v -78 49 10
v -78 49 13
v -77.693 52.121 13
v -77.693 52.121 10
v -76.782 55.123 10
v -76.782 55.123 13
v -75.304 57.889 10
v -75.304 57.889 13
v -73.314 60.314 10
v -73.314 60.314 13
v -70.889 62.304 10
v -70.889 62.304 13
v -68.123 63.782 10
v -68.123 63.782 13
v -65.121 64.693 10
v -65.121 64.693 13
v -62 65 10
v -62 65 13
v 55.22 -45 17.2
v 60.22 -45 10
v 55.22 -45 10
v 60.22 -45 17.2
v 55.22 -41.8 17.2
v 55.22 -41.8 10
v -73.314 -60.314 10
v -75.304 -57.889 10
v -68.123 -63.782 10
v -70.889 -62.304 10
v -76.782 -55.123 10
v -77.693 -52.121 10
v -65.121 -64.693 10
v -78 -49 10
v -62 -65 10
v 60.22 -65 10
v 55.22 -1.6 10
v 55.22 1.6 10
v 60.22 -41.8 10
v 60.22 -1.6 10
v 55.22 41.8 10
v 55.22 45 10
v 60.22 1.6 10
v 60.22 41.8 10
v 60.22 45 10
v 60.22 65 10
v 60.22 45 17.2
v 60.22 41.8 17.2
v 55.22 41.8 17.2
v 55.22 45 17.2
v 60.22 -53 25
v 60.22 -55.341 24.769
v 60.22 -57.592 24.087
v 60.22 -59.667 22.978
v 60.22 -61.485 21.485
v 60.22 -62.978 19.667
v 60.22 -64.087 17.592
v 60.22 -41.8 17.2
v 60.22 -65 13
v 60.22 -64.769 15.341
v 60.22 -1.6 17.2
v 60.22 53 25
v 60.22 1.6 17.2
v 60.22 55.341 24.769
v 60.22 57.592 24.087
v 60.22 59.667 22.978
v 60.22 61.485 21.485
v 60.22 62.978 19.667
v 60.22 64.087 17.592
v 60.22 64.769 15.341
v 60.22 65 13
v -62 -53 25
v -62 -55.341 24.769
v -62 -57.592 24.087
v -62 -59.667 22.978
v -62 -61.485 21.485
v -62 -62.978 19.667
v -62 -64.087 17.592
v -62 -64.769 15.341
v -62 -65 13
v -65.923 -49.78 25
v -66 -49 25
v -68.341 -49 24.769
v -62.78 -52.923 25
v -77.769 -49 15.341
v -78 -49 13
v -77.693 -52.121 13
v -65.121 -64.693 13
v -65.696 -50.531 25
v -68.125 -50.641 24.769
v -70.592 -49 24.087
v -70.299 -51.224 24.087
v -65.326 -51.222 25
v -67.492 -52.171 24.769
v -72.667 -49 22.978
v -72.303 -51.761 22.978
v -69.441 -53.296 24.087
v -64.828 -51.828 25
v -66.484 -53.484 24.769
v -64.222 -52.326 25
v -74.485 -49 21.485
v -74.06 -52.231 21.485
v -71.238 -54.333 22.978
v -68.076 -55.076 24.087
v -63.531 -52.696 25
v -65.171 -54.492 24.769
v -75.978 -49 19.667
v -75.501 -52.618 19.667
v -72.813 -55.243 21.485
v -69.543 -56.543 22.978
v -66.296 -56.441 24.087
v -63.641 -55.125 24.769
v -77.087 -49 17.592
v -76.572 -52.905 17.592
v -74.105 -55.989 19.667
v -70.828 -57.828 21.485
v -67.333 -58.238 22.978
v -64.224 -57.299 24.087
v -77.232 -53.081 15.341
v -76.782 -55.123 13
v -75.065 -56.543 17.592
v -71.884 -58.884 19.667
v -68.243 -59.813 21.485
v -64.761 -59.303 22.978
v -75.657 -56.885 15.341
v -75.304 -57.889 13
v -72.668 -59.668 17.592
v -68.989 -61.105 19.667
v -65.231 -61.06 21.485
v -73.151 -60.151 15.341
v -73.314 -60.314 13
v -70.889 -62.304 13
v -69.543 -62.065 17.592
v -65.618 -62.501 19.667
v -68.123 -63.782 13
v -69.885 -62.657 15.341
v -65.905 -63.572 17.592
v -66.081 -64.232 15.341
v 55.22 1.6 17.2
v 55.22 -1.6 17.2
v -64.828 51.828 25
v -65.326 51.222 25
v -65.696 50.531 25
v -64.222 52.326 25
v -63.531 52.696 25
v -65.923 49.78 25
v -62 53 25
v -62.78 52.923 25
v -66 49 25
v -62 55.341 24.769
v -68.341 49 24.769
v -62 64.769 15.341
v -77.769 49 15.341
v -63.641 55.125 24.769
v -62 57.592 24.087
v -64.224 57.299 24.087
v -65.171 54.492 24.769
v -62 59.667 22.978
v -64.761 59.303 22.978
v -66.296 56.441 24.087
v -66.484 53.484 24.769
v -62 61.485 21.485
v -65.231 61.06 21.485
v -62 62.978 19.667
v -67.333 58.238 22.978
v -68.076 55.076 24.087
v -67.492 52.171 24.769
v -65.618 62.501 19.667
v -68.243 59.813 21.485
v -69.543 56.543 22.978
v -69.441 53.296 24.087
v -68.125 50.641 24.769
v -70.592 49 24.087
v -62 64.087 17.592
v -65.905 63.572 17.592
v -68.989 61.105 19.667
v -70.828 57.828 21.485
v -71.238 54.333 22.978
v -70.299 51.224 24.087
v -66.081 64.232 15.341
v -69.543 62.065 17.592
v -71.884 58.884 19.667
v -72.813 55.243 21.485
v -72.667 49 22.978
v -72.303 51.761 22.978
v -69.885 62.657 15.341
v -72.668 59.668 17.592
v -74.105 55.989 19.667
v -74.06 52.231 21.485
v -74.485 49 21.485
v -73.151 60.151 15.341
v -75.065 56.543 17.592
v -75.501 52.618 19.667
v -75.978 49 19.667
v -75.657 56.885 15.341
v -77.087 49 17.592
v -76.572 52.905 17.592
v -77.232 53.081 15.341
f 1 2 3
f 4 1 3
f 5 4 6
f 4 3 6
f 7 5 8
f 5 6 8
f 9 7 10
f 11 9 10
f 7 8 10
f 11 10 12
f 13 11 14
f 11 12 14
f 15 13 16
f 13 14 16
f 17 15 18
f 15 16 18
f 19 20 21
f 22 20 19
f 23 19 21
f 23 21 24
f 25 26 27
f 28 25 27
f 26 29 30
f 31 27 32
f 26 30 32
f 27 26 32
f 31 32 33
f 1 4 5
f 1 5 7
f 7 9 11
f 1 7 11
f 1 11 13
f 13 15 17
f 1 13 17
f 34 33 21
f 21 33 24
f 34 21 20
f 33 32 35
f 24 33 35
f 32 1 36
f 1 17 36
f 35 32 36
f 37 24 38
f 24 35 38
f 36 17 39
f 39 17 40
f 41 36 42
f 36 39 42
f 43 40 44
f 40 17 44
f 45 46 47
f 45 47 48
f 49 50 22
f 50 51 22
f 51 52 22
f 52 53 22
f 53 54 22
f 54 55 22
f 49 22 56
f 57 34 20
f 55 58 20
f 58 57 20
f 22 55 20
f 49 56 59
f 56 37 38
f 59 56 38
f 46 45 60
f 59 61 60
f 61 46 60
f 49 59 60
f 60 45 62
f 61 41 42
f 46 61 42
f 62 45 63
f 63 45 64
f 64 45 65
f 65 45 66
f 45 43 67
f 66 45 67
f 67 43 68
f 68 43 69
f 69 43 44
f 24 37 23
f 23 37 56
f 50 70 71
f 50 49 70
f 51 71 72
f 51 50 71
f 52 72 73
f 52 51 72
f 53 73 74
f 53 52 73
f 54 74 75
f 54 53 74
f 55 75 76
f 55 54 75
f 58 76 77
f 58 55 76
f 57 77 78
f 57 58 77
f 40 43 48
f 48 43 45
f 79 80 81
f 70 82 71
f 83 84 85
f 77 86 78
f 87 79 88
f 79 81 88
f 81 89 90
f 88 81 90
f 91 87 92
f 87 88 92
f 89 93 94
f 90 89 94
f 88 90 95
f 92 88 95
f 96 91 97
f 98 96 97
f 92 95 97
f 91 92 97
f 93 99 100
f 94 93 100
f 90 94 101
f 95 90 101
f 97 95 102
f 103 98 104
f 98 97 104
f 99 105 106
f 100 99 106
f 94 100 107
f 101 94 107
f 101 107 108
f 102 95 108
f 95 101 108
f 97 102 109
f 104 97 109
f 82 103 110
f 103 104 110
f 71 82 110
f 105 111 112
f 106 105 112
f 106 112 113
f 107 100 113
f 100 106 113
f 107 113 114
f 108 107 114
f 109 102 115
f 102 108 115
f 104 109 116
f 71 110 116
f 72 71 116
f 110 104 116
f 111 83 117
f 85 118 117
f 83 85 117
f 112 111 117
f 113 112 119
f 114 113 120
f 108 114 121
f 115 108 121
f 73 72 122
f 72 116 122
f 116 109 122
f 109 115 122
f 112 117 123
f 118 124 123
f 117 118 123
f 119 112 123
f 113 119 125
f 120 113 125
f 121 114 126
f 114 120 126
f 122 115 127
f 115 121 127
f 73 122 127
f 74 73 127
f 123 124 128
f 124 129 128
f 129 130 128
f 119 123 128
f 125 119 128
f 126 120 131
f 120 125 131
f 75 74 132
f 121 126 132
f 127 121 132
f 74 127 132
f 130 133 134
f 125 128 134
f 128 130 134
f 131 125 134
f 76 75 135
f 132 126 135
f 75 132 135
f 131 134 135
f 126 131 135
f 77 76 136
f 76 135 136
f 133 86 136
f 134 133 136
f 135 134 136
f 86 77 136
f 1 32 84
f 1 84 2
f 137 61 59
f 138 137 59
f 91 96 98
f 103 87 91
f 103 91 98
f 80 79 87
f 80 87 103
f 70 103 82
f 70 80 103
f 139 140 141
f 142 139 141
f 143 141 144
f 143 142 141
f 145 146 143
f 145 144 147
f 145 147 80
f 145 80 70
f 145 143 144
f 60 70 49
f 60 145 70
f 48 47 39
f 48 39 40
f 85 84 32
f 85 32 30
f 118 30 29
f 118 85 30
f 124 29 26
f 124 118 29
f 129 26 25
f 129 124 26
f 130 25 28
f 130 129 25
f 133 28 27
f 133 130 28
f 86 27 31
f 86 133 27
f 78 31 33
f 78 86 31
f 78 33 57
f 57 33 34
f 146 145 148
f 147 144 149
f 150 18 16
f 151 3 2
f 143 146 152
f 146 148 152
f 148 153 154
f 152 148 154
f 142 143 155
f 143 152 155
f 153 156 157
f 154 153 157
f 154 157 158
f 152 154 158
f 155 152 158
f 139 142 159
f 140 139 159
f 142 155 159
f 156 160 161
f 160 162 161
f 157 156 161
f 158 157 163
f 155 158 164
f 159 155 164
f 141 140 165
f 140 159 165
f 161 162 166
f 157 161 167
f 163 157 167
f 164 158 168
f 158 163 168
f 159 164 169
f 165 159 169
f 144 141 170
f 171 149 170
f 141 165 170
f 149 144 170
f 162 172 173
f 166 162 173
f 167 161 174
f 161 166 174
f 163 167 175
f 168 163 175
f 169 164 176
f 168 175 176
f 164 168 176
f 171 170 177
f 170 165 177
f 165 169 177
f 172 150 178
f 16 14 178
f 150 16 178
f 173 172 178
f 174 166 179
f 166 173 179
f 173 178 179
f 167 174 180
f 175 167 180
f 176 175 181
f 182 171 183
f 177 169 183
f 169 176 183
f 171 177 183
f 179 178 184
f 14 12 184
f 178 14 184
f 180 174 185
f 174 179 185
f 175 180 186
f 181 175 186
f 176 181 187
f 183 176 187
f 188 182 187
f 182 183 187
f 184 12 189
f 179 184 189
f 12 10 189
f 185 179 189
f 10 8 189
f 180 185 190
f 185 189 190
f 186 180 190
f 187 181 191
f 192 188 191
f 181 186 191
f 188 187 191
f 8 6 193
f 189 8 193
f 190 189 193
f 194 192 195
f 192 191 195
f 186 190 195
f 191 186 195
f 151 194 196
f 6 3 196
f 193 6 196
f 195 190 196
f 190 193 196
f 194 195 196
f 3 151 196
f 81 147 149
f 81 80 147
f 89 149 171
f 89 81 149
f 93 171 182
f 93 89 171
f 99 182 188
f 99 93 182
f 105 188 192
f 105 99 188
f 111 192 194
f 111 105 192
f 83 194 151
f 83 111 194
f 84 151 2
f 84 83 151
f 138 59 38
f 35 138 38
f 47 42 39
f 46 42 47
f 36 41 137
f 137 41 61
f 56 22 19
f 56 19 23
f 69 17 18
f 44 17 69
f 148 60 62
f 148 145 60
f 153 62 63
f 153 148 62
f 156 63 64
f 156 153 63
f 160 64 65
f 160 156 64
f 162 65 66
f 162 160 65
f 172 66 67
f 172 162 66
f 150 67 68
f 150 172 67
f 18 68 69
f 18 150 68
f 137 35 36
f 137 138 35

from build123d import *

# Parameters (mm, degrees)
F0_W     = 138.2199470003
F0_H     = 130
F1_DEPTH = 25
F2_R     = 16
F3_R     = 12
F4_DEPTH = 10
F5_W     = 3.2
F5_H     = 7.2
F6_DEPTH = 5


with BuildPart() as f1:
    # F0 (on Top) → F1 (new body)
    with BuildSketch(Plane.XY):
        with Locations((-8.8900264998, 0)):
            Rectangle(F0_W, F0_H)
    extrude(amount=F1_DEPTH)

    # F2
    f2_edges = [f1.edges().sort_by_distance(p)[0] for p in [
        (-78, -65, 12.5),
        (-78, 65, 12.5),
    ]]
    fillet(f2_edges, radius=F2_R)

    # F3
    f3_edges = [f1.edges().sort_by_distance(p)[0] for p in [
        (-0.890026, -65, 25),
    ]]
    fillet(f3_edges, radius=F3_R)

    # F4 (cut): a face of the model
    f4_faces = [f1.faces().sort_by_distance(p)[0] for p in [
        (-8.4868143179, 0, 0),
    ]]
    extrude(f4_faces, amount=-F4_DEPTH, mode=Mode.SUBTRACT)

    # F5 (on face) → F6 (cut)
    with BuildSketch(Plane.YZ.offset(60.2199470003)):
        with Locations((-43.4, 13.6)):
            Rectangle(F5_W, F5_H)
        Polygon((-1.6, 10), (0, 10), (1.6, 10), (1.6, 17.2), (0, 17.2), (-1.6, 17.2), align=None)
        with Locations((43.4, 13.6)):
            Rectangle(F5_W, F5_H)
    extrude(amount=-F6_DEPTH, mode=Mode.SUBTRACT)


solid = f1.part
